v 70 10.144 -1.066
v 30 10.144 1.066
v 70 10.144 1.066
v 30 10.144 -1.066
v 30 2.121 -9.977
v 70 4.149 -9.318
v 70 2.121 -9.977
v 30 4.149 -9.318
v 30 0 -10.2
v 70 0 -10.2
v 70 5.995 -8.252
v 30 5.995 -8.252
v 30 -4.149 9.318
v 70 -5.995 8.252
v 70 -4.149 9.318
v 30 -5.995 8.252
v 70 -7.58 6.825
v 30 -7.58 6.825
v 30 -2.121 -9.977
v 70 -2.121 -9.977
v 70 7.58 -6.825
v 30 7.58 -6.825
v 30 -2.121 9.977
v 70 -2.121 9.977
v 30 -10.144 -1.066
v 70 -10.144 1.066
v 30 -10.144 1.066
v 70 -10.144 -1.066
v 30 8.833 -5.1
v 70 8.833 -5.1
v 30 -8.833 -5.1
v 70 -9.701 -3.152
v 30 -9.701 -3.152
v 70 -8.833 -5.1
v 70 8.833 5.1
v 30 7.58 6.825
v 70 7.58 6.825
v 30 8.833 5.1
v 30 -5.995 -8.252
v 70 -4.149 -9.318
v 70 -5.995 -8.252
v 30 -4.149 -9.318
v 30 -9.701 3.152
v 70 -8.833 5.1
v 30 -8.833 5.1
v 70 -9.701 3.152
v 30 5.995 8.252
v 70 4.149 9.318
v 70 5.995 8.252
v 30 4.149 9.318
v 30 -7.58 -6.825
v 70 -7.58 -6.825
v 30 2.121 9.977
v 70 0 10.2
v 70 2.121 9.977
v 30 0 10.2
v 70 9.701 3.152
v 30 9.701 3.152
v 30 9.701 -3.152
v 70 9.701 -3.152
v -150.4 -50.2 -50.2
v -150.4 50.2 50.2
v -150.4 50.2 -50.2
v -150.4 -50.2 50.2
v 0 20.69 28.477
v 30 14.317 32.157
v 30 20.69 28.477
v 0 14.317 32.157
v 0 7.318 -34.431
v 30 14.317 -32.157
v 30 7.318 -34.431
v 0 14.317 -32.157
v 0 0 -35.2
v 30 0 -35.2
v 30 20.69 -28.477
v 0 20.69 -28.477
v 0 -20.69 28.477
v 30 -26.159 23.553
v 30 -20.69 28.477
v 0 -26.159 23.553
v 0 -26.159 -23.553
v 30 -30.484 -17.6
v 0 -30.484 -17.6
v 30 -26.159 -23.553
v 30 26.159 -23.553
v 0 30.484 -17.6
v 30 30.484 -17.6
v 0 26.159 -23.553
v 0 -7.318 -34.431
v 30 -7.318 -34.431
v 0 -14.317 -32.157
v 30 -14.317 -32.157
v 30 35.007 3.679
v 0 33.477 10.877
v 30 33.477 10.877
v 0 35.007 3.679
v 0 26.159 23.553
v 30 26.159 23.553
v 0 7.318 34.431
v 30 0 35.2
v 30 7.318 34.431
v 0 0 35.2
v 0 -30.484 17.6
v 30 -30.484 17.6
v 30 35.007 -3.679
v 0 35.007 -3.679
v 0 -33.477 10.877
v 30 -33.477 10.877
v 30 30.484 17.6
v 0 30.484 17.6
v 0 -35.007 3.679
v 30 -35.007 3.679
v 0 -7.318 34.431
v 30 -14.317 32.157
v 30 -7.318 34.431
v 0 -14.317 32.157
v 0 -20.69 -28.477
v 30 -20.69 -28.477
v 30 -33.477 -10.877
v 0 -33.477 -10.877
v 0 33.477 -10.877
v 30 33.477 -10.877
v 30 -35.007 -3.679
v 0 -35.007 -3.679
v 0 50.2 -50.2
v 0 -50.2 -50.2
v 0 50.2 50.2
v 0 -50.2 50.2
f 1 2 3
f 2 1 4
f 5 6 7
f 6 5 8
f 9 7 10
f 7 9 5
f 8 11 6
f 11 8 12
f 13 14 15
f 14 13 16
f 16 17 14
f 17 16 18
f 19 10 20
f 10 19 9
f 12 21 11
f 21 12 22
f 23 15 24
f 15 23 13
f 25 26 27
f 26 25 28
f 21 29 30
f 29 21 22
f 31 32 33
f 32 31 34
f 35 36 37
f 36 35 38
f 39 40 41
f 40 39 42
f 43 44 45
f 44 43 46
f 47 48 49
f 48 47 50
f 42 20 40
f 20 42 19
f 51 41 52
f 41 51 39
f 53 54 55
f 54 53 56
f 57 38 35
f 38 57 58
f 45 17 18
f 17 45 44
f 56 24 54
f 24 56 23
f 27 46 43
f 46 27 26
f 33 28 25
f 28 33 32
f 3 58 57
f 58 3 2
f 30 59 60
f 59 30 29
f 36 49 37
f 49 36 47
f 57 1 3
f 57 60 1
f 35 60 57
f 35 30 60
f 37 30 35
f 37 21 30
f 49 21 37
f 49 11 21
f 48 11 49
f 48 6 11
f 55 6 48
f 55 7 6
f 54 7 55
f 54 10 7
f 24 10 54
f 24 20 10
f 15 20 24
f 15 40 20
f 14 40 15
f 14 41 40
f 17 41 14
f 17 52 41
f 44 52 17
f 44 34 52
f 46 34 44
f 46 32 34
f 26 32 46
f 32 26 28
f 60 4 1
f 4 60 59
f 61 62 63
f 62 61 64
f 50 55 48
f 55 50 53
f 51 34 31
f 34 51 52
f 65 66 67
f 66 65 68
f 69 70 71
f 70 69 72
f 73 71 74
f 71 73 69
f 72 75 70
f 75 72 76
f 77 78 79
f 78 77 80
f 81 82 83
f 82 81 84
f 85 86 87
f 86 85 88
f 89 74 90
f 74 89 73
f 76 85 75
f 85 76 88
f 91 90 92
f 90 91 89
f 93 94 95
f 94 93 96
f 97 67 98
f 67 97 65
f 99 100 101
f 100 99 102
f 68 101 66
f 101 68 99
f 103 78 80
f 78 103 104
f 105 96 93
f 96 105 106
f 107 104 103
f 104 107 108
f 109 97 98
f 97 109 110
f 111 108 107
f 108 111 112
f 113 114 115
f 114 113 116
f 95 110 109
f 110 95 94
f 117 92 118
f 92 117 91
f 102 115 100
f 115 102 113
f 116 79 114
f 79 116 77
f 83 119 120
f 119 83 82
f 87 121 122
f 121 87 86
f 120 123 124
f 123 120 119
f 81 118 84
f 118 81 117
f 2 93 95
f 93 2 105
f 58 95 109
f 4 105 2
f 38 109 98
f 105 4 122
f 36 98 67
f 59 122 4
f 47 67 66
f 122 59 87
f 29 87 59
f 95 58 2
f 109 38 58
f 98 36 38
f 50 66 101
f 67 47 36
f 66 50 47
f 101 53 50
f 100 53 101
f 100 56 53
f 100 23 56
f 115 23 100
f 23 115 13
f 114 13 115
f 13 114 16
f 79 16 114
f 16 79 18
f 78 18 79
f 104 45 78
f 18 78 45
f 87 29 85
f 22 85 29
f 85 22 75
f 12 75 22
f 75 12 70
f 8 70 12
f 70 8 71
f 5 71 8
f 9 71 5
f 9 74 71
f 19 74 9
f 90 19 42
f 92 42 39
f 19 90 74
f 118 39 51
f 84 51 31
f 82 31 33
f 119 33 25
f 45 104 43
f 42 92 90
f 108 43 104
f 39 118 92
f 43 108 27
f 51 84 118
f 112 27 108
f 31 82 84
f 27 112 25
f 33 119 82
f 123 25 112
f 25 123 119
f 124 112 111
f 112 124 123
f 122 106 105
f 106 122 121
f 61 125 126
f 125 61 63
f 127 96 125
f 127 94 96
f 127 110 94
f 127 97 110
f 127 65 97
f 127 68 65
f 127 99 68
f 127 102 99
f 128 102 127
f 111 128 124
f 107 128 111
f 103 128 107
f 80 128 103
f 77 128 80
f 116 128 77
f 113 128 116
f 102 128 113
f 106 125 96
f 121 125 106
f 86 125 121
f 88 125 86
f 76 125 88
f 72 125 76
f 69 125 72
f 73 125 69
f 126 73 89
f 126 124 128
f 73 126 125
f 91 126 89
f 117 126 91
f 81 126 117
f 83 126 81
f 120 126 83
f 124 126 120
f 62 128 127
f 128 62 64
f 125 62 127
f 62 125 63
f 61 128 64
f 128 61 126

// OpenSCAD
function BoxWidth(3dPrinterTolerance=.4)=100+3dPrinterTolerance;
function BoxHeight(3dPrinterTolerance=.4)=150+3dPrinterTolerance;
function HubDiameter(3dPrinterTolerance=.4)=70+3dPrinterTolerance;
function HubHeight(3dPrinterTolerance=.4)=180+3dPrinterTolerance;
function ShaftDiameter(3dPrinterTolerance=.4)=20+3dPrinterTolerance;
function ShaftHeight(3dPrinterTolerance=.4)=220+3dPrinterTolerance;

module GenericStepper(3dPrinterTolerance=.4)
{
color("Gray")
rotate([0,90,0])
{
	translate([0,0,-BoxHeight(3dPrinterTolerance)])
		{
		union()
			{
			cylinder(ShaftHeight(3dPrinterTolerance), ShaftDiameter(3dPrinterTolerance)/2, ShaftDiameter(3dPrinterTolerance)/2);
			cylinder(HubHeight(3dPrinterTolerance), HubDiameter(3dPrinterTolerance)/2, HubDiameter(3dPrinterTolerance)/2);
			translate([-BoxWidth(3dPrinterTolerance)/2,-BoxWidth(3dPrinterTolerance)/2,0])
				{
				cube([BoxWidth(3dPrinterTolerance), BoxWidth(3dPrinterTolerance), BoxHeight(3dPrinterTolerance)]);
				}
			}
		}
	}
}

GenericStepper(.4);
